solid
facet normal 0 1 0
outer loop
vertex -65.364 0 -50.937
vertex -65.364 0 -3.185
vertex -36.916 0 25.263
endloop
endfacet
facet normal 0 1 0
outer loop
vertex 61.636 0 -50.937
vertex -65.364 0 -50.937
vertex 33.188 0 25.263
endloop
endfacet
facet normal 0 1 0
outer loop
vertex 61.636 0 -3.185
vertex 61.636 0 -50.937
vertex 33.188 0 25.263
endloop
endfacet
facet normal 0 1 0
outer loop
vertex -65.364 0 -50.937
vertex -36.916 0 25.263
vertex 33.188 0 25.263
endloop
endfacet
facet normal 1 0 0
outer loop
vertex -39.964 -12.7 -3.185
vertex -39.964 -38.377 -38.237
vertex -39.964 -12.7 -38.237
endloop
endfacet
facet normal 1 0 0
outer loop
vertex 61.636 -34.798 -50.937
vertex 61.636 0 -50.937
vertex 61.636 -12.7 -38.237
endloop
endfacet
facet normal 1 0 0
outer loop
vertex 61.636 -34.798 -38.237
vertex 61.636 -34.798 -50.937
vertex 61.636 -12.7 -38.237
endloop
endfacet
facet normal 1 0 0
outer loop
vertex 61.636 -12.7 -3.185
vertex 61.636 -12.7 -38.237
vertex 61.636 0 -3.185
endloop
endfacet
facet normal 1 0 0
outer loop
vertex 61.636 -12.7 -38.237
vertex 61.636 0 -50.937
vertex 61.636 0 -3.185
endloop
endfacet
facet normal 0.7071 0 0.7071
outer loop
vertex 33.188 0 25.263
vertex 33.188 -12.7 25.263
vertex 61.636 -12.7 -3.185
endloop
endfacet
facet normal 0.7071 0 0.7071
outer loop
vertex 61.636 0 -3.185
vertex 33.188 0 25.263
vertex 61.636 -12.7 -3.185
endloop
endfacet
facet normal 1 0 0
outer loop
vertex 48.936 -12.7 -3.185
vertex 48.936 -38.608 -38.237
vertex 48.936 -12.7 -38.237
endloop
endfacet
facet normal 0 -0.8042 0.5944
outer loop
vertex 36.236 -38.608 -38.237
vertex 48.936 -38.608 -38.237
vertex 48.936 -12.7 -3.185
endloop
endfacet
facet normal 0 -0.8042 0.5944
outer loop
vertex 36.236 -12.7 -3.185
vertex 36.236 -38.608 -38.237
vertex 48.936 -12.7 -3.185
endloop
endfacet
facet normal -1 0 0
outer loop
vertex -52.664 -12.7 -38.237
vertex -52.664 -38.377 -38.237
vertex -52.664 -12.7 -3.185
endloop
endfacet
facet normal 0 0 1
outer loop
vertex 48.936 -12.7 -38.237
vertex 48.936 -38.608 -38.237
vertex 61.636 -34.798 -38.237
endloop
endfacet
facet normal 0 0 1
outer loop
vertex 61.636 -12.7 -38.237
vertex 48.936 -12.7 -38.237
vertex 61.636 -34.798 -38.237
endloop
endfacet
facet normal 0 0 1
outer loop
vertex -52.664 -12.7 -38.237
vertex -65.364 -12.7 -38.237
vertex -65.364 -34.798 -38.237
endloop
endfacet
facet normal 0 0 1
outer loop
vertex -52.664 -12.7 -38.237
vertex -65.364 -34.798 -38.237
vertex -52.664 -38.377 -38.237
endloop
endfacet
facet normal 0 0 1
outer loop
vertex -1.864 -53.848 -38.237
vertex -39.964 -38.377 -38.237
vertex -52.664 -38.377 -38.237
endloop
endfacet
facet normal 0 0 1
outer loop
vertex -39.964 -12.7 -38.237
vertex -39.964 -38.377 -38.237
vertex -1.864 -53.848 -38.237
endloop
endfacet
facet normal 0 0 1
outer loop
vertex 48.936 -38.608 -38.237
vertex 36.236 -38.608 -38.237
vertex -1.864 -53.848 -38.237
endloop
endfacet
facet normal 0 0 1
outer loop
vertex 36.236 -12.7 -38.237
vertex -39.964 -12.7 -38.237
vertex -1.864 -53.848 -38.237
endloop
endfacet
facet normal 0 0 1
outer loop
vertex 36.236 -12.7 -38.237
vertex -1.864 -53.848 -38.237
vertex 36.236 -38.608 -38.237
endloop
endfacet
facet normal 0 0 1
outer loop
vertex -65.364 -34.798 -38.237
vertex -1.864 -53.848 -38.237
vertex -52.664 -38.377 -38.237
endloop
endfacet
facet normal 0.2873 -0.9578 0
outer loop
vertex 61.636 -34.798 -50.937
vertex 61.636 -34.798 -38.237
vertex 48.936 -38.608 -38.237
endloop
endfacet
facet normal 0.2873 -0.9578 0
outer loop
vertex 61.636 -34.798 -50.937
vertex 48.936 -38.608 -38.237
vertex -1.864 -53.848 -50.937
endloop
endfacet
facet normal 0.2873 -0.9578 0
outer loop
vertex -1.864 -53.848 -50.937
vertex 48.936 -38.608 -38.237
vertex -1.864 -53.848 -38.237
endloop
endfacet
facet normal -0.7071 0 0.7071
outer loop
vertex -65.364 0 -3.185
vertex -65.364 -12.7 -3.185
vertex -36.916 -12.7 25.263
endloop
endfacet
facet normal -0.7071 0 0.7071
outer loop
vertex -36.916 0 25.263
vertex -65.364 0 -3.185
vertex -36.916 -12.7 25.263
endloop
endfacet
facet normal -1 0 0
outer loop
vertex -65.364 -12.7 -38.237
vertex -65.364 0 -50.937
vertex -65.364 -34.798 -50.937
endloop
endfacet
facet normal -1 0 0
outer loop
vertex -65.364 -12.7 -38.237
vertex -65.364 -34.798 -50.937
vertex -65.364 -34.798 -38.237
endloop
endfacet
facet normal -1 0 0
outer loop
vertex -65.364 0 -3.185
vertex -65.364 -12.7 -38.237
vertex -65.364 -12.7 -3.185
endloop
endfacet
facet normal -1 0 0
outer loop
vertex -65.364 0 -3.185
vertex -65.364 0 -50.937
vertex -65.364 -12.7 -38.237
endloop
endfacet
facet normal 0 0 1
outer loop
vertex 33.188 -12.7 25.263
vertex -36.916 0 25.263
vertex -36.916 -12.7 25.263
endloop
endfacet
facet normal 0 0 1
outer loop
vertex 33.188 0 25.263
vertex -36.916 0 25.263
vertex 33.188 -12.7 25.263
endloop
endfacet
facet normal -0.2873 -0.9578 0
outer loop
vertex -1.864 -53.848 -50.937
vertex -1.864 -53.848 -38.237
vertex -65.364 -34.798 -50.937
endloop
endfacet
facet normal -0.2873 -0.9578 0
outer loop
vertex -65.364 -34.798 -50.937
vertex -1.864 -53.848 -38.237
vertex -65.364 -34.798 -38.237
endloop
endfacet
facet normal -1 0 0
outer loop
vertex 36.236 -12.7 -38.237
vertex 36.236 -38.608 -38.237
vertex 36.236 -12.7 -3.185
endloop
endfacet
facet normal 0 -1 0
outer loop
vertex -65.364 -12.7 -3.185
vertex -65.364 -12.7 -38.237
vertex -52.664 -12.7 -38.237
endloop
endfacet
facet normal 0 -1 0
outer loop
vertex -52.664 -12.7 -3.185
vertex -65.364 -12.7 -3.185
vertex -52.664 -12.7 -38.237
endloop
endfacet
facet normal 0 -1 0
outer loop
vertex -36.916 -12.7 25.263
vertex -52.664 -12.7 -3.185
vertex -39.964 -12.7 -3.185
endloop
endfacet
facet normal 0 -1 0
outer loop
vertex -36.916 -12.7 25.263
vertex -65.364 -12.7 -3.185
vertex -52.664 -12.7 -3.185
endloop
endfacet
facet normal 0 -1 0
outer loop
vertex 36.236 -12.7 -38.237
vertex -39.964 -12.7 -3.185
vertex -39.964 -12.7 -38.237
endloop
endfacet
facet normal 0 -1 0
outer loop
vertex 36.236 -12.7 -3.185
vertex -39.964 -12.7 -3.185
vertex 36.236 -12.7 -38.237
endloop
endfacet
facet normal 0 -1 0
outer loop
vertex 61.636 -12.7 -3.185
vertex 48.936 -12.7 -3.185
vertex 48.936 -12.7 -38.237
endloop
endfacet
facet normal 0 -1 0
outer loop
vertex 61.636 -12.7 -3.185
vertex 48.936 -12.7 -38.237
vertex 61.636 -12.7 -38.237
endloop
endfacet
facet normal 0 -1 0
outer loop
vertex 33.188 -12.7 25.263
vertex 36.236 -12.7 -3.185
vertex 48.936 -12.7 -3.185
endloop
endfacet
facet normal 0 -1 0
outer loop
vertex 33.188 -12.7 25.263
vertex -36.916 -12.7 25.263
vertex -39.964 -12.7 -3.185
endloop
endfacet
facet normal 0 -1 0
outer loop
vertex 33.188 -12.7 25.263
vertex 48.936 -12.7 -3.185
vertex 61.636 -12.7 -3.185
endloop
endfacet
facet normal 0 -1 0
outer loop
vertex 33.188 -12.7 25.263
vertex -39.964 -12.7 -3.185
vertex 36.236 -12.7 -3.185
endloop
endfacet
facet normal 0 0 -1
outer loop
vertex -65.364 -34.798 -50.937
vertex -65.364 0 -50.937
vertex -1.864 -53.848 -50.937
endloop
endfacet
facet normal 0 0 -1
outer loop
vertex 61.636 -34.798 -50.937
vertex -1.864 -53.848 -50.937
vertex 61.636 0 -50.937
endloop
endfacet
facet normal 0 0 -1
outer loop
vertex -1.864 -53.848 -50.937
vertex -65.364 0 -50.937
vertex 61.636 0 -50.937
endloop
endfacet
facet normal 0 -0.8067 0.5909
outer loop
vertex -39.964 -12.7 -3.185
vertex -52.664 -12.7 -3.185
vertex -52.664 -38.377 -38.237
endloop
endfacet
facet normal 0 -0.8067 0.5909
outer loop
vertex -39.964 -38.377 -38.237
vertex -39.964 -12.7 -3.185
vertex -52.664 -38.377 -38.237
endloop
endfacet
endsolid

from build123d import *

# Parameters (mm, degrees)
F0_W      = 127
F0_H      = 76.2
F1_DEPTH  = 53.848
F2_W      = 127
F2_H      = 41.148
F3_DEPTH  = 63.5
F5_DEPTH  = 12.7
F7_DEPTH  = 12.7
F8_W      = 12.7
F8_H      = 26.142063
F9_DEPTH  = 35.052
F11_DEPTH = 12.7
F12_W     = 12.7
F12_H     = 25.67689
F13_DEPTH = 35.052
F15_DEPTH = 12.7


with BuildPart() as f1:
    # F0 (on Front) → F1 (new body)
    with BuildSketch(Plane.XZ):
        with Locations((-1.86439, -12.836598)):
            Rectangle(F0_W, F0_H)
    extrude(amount=F1_DEPTH)

    # F2 (on face) → F3 (cut)
    with BuildSketch(Plane.XY.offset(25.263402)):
        with Locations((-1.86439, -33.274)):
            Rectangle(F2_W, F2_H)
    extrude(amount=-F3_DEPTH, mode=Mode.SUBTRACT)

    # F4 (on face) → F5 (cut)
    with BuildSketch(Plane.XZ.offset(12.7)):
        Polygon((-36.91639, 25.263402), (-65.36439, 25.263402), (-65.36439, -3.184598), align=None)
        Polygon((61.63561, 25.263402), (33.18761, 25.263402), (61.63561, -3.184598), align=None)
    extrude(amount=-F5_DEPTH, mode=Mode.SUBTRACT)

    # F6 (on face) → F7 (cut)
    with BuildSketch(Plane.XY.offset(-38.236598)):
        Polygon((-65.36439, -53.848), (-1.86439, -53.848), (-65.36439, -34.798), align=None)
        Polygon((-1.86439, -53.848), (61.63561, -53.848), (61.63561, -34.798), align=None)
    extrude(amount=-F7_DEPTH, mode=Mode.SUBTRACT)

    # F8 (on face) → F9 (join)
    with BuildSketch(Plane.XY.offset(-38.236598)):
        with Locations((42.58561, -25.771031)):
            Rectangle(F8_W, F8_H)
    extrude(amount=F9_DEPTH)

    # F10 (on face) → F11 (cut)
    with BuildSketch(Plane.YZ.offset(48.93561)):
        Polygon((-38.842063, -38.236598), (-38.608, -38.236598), (-12.7, -3.184598), (-38.842063, -3.184598), align=None)
    extrude(amount=-F11_DEPTH, mode=Mode.SUBTRACT)

    # F12 (on face) → F13 (join)
    with BuildSketch(Plane.XY.offset(-38.236598)):
        with Locations((-46.31439, -25.538445)):
            Rectangle(F12_W, F12_H)
    extrude(amount=F13_DEPTH)

    # F14 (on face) → F15 (cut)
    with BuildSketch(Plane(origin=(-52.66439, 0, 0), x_dir=(0, -1, 0), z_dir=(-1, 0, 0))):
        Polygon((38.37689, -3.184598), (12.7, -3.184598), (38.37689, -38.236598), align=None)
    extrude(amount=-F15_DEPTH, mode=Mode.SUBTRACT)


solid = f1.part
